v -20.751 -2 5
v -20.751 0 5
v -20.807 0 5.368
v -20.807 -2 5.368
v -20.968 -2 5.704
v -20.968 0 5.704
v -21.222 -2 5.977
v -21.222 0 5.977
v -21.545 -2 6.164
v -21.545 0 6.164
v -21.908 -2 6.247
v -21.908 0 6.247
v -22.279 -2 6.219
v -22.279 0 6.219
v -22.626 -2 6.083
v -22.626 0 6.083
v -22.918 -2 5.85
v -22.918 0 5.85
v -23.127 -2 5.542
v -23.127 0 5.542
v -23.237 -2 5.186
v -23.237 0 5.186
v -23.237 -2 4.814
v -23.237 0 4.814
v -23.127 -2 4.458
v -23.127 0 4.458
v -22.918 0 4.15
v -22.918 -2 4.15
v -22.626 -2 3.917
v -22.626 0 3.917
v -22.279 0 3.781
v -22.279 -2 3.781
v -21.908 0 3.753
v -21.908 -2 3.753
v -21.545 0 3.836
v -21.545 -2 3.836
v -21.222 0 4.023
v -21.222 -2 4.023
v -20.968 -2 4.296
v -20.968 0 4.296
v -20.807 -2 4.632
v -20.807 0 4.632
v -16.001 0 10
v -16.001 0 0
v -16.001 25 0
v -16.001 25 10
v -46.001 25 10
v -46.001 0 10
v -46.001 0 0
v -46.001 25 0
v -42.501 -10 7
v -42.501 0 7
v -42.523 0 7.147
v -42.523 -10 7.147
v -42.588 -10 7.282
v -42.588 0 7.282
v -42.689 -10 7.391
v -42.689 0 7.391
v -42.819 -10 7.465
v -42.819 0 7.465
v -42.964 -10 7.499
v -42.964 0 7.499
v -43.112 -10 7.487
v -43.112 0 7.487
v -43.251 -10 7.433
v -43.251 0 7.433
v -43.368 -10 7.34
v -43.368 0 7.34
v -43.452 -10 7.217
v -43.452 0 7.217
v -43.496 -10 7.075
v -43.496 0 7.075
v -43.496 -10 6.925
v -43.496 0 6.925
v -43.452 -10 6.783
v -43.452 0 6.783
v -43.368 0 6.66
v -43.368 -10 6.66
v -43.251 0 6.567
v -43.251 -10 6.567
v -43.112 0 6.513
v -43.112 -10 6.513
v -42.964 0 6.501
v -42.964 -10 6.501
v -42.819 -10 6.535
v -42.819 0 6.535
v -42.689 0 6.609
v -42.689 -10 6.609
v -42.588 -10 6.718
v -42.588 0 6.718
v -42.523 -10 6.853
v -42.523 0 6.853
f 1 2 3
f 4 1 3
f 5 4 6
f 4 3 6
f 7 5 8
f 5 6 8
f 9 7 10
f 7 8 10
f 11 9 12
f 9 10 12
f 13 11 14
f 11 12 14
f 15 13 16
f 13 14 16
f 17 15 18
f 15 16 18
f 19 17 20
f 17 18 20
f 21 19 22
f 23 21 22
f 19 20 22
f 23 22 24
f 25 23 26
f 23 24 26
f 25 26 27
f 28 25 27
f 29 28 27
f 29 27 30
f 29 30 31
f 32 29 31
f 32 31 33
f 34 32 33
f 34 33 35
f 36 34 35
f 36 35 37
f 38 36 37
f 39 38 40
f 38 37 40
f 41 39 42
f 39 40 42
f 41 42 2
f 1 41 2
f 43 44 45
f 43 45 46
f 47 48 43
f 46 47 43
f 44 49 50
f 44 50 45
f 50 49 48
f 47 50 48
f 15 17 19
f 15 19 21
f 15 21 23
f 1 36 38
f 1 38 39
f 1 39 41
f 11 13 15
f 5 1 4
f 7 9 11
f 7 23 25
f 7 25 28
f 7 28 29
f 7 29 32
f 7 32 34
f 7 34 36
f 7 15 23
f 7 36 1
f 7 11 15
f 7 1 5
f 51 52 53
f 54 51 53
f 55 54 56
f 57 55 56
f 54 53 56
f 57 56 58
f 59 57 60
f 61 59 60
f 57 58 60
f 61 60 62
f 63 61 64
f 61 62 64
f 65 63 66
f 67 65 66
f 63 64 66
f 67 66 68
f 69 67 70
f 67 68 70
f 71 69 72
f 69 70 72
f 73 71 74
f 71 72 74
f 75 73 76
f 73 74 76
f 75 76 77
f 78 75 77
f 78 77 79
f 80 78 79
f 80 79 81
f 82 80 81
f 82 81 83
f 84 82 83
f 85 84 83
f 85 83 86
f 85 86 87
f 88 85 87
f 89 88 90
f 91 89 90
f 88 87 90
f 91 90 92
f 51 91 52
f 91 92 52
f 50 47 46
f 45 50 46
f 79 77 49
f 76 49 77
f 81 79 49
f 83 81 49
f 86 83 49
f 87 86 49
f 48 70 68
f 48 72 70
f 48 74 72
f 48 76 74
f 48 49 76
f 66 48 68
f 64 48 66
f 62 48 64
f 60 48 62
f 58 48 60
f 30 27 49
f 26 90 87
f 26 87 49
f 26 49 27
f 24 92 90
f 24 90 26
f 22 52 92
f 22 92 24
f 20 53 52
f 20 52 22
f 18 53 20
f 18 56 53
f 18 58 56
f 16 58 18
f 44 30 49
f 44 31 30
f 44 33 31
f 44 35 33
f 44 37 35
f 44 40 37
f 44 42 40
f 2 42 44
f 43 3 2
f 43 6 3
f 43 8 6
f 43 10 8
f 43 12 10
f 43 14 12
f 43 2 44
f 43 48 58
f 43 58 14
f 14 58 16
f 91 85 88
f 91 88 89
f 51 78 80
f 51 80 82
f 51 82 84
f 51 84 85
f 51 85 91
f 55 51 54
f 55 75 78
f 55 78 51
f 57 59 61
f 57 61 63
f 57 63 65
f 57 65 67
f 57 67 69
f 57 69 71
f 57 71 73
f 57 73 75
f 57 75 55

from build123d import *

# Parameters (mm, degrees)
F0_W     = 30
F0_H     = 10
F1_DEPTH = 25
F2_R     = 1.25
F3_DEPTH = 2
F4_R     = 0.5
F5_DEPTH = 10


with BuildPart() as f1:
    # F0 (on Front) → F1 (new body)
    with BuildSketch(Plane.XZ):
        with Locations((-31.001214, 5)):
            Rectangle(F0_W, F0_H)
    extrude(amount=-F1_DEPTH)

    # F2 (on face) → F3 (join)
    with BuildSketch(Plane.XZ):
        with Locations((-22.001214, 5)):
            Circle(F2_R)
    extrude(amount=F3_DEPTH)

    # F4 (on face) → F5 (join)
    with BuildSketch(Plane.XZ):
        with Locations((-43.001214, 7)):
            Circle(F4_R)
    extrude(amount=F5_DEPTH)


solid = f1.part
